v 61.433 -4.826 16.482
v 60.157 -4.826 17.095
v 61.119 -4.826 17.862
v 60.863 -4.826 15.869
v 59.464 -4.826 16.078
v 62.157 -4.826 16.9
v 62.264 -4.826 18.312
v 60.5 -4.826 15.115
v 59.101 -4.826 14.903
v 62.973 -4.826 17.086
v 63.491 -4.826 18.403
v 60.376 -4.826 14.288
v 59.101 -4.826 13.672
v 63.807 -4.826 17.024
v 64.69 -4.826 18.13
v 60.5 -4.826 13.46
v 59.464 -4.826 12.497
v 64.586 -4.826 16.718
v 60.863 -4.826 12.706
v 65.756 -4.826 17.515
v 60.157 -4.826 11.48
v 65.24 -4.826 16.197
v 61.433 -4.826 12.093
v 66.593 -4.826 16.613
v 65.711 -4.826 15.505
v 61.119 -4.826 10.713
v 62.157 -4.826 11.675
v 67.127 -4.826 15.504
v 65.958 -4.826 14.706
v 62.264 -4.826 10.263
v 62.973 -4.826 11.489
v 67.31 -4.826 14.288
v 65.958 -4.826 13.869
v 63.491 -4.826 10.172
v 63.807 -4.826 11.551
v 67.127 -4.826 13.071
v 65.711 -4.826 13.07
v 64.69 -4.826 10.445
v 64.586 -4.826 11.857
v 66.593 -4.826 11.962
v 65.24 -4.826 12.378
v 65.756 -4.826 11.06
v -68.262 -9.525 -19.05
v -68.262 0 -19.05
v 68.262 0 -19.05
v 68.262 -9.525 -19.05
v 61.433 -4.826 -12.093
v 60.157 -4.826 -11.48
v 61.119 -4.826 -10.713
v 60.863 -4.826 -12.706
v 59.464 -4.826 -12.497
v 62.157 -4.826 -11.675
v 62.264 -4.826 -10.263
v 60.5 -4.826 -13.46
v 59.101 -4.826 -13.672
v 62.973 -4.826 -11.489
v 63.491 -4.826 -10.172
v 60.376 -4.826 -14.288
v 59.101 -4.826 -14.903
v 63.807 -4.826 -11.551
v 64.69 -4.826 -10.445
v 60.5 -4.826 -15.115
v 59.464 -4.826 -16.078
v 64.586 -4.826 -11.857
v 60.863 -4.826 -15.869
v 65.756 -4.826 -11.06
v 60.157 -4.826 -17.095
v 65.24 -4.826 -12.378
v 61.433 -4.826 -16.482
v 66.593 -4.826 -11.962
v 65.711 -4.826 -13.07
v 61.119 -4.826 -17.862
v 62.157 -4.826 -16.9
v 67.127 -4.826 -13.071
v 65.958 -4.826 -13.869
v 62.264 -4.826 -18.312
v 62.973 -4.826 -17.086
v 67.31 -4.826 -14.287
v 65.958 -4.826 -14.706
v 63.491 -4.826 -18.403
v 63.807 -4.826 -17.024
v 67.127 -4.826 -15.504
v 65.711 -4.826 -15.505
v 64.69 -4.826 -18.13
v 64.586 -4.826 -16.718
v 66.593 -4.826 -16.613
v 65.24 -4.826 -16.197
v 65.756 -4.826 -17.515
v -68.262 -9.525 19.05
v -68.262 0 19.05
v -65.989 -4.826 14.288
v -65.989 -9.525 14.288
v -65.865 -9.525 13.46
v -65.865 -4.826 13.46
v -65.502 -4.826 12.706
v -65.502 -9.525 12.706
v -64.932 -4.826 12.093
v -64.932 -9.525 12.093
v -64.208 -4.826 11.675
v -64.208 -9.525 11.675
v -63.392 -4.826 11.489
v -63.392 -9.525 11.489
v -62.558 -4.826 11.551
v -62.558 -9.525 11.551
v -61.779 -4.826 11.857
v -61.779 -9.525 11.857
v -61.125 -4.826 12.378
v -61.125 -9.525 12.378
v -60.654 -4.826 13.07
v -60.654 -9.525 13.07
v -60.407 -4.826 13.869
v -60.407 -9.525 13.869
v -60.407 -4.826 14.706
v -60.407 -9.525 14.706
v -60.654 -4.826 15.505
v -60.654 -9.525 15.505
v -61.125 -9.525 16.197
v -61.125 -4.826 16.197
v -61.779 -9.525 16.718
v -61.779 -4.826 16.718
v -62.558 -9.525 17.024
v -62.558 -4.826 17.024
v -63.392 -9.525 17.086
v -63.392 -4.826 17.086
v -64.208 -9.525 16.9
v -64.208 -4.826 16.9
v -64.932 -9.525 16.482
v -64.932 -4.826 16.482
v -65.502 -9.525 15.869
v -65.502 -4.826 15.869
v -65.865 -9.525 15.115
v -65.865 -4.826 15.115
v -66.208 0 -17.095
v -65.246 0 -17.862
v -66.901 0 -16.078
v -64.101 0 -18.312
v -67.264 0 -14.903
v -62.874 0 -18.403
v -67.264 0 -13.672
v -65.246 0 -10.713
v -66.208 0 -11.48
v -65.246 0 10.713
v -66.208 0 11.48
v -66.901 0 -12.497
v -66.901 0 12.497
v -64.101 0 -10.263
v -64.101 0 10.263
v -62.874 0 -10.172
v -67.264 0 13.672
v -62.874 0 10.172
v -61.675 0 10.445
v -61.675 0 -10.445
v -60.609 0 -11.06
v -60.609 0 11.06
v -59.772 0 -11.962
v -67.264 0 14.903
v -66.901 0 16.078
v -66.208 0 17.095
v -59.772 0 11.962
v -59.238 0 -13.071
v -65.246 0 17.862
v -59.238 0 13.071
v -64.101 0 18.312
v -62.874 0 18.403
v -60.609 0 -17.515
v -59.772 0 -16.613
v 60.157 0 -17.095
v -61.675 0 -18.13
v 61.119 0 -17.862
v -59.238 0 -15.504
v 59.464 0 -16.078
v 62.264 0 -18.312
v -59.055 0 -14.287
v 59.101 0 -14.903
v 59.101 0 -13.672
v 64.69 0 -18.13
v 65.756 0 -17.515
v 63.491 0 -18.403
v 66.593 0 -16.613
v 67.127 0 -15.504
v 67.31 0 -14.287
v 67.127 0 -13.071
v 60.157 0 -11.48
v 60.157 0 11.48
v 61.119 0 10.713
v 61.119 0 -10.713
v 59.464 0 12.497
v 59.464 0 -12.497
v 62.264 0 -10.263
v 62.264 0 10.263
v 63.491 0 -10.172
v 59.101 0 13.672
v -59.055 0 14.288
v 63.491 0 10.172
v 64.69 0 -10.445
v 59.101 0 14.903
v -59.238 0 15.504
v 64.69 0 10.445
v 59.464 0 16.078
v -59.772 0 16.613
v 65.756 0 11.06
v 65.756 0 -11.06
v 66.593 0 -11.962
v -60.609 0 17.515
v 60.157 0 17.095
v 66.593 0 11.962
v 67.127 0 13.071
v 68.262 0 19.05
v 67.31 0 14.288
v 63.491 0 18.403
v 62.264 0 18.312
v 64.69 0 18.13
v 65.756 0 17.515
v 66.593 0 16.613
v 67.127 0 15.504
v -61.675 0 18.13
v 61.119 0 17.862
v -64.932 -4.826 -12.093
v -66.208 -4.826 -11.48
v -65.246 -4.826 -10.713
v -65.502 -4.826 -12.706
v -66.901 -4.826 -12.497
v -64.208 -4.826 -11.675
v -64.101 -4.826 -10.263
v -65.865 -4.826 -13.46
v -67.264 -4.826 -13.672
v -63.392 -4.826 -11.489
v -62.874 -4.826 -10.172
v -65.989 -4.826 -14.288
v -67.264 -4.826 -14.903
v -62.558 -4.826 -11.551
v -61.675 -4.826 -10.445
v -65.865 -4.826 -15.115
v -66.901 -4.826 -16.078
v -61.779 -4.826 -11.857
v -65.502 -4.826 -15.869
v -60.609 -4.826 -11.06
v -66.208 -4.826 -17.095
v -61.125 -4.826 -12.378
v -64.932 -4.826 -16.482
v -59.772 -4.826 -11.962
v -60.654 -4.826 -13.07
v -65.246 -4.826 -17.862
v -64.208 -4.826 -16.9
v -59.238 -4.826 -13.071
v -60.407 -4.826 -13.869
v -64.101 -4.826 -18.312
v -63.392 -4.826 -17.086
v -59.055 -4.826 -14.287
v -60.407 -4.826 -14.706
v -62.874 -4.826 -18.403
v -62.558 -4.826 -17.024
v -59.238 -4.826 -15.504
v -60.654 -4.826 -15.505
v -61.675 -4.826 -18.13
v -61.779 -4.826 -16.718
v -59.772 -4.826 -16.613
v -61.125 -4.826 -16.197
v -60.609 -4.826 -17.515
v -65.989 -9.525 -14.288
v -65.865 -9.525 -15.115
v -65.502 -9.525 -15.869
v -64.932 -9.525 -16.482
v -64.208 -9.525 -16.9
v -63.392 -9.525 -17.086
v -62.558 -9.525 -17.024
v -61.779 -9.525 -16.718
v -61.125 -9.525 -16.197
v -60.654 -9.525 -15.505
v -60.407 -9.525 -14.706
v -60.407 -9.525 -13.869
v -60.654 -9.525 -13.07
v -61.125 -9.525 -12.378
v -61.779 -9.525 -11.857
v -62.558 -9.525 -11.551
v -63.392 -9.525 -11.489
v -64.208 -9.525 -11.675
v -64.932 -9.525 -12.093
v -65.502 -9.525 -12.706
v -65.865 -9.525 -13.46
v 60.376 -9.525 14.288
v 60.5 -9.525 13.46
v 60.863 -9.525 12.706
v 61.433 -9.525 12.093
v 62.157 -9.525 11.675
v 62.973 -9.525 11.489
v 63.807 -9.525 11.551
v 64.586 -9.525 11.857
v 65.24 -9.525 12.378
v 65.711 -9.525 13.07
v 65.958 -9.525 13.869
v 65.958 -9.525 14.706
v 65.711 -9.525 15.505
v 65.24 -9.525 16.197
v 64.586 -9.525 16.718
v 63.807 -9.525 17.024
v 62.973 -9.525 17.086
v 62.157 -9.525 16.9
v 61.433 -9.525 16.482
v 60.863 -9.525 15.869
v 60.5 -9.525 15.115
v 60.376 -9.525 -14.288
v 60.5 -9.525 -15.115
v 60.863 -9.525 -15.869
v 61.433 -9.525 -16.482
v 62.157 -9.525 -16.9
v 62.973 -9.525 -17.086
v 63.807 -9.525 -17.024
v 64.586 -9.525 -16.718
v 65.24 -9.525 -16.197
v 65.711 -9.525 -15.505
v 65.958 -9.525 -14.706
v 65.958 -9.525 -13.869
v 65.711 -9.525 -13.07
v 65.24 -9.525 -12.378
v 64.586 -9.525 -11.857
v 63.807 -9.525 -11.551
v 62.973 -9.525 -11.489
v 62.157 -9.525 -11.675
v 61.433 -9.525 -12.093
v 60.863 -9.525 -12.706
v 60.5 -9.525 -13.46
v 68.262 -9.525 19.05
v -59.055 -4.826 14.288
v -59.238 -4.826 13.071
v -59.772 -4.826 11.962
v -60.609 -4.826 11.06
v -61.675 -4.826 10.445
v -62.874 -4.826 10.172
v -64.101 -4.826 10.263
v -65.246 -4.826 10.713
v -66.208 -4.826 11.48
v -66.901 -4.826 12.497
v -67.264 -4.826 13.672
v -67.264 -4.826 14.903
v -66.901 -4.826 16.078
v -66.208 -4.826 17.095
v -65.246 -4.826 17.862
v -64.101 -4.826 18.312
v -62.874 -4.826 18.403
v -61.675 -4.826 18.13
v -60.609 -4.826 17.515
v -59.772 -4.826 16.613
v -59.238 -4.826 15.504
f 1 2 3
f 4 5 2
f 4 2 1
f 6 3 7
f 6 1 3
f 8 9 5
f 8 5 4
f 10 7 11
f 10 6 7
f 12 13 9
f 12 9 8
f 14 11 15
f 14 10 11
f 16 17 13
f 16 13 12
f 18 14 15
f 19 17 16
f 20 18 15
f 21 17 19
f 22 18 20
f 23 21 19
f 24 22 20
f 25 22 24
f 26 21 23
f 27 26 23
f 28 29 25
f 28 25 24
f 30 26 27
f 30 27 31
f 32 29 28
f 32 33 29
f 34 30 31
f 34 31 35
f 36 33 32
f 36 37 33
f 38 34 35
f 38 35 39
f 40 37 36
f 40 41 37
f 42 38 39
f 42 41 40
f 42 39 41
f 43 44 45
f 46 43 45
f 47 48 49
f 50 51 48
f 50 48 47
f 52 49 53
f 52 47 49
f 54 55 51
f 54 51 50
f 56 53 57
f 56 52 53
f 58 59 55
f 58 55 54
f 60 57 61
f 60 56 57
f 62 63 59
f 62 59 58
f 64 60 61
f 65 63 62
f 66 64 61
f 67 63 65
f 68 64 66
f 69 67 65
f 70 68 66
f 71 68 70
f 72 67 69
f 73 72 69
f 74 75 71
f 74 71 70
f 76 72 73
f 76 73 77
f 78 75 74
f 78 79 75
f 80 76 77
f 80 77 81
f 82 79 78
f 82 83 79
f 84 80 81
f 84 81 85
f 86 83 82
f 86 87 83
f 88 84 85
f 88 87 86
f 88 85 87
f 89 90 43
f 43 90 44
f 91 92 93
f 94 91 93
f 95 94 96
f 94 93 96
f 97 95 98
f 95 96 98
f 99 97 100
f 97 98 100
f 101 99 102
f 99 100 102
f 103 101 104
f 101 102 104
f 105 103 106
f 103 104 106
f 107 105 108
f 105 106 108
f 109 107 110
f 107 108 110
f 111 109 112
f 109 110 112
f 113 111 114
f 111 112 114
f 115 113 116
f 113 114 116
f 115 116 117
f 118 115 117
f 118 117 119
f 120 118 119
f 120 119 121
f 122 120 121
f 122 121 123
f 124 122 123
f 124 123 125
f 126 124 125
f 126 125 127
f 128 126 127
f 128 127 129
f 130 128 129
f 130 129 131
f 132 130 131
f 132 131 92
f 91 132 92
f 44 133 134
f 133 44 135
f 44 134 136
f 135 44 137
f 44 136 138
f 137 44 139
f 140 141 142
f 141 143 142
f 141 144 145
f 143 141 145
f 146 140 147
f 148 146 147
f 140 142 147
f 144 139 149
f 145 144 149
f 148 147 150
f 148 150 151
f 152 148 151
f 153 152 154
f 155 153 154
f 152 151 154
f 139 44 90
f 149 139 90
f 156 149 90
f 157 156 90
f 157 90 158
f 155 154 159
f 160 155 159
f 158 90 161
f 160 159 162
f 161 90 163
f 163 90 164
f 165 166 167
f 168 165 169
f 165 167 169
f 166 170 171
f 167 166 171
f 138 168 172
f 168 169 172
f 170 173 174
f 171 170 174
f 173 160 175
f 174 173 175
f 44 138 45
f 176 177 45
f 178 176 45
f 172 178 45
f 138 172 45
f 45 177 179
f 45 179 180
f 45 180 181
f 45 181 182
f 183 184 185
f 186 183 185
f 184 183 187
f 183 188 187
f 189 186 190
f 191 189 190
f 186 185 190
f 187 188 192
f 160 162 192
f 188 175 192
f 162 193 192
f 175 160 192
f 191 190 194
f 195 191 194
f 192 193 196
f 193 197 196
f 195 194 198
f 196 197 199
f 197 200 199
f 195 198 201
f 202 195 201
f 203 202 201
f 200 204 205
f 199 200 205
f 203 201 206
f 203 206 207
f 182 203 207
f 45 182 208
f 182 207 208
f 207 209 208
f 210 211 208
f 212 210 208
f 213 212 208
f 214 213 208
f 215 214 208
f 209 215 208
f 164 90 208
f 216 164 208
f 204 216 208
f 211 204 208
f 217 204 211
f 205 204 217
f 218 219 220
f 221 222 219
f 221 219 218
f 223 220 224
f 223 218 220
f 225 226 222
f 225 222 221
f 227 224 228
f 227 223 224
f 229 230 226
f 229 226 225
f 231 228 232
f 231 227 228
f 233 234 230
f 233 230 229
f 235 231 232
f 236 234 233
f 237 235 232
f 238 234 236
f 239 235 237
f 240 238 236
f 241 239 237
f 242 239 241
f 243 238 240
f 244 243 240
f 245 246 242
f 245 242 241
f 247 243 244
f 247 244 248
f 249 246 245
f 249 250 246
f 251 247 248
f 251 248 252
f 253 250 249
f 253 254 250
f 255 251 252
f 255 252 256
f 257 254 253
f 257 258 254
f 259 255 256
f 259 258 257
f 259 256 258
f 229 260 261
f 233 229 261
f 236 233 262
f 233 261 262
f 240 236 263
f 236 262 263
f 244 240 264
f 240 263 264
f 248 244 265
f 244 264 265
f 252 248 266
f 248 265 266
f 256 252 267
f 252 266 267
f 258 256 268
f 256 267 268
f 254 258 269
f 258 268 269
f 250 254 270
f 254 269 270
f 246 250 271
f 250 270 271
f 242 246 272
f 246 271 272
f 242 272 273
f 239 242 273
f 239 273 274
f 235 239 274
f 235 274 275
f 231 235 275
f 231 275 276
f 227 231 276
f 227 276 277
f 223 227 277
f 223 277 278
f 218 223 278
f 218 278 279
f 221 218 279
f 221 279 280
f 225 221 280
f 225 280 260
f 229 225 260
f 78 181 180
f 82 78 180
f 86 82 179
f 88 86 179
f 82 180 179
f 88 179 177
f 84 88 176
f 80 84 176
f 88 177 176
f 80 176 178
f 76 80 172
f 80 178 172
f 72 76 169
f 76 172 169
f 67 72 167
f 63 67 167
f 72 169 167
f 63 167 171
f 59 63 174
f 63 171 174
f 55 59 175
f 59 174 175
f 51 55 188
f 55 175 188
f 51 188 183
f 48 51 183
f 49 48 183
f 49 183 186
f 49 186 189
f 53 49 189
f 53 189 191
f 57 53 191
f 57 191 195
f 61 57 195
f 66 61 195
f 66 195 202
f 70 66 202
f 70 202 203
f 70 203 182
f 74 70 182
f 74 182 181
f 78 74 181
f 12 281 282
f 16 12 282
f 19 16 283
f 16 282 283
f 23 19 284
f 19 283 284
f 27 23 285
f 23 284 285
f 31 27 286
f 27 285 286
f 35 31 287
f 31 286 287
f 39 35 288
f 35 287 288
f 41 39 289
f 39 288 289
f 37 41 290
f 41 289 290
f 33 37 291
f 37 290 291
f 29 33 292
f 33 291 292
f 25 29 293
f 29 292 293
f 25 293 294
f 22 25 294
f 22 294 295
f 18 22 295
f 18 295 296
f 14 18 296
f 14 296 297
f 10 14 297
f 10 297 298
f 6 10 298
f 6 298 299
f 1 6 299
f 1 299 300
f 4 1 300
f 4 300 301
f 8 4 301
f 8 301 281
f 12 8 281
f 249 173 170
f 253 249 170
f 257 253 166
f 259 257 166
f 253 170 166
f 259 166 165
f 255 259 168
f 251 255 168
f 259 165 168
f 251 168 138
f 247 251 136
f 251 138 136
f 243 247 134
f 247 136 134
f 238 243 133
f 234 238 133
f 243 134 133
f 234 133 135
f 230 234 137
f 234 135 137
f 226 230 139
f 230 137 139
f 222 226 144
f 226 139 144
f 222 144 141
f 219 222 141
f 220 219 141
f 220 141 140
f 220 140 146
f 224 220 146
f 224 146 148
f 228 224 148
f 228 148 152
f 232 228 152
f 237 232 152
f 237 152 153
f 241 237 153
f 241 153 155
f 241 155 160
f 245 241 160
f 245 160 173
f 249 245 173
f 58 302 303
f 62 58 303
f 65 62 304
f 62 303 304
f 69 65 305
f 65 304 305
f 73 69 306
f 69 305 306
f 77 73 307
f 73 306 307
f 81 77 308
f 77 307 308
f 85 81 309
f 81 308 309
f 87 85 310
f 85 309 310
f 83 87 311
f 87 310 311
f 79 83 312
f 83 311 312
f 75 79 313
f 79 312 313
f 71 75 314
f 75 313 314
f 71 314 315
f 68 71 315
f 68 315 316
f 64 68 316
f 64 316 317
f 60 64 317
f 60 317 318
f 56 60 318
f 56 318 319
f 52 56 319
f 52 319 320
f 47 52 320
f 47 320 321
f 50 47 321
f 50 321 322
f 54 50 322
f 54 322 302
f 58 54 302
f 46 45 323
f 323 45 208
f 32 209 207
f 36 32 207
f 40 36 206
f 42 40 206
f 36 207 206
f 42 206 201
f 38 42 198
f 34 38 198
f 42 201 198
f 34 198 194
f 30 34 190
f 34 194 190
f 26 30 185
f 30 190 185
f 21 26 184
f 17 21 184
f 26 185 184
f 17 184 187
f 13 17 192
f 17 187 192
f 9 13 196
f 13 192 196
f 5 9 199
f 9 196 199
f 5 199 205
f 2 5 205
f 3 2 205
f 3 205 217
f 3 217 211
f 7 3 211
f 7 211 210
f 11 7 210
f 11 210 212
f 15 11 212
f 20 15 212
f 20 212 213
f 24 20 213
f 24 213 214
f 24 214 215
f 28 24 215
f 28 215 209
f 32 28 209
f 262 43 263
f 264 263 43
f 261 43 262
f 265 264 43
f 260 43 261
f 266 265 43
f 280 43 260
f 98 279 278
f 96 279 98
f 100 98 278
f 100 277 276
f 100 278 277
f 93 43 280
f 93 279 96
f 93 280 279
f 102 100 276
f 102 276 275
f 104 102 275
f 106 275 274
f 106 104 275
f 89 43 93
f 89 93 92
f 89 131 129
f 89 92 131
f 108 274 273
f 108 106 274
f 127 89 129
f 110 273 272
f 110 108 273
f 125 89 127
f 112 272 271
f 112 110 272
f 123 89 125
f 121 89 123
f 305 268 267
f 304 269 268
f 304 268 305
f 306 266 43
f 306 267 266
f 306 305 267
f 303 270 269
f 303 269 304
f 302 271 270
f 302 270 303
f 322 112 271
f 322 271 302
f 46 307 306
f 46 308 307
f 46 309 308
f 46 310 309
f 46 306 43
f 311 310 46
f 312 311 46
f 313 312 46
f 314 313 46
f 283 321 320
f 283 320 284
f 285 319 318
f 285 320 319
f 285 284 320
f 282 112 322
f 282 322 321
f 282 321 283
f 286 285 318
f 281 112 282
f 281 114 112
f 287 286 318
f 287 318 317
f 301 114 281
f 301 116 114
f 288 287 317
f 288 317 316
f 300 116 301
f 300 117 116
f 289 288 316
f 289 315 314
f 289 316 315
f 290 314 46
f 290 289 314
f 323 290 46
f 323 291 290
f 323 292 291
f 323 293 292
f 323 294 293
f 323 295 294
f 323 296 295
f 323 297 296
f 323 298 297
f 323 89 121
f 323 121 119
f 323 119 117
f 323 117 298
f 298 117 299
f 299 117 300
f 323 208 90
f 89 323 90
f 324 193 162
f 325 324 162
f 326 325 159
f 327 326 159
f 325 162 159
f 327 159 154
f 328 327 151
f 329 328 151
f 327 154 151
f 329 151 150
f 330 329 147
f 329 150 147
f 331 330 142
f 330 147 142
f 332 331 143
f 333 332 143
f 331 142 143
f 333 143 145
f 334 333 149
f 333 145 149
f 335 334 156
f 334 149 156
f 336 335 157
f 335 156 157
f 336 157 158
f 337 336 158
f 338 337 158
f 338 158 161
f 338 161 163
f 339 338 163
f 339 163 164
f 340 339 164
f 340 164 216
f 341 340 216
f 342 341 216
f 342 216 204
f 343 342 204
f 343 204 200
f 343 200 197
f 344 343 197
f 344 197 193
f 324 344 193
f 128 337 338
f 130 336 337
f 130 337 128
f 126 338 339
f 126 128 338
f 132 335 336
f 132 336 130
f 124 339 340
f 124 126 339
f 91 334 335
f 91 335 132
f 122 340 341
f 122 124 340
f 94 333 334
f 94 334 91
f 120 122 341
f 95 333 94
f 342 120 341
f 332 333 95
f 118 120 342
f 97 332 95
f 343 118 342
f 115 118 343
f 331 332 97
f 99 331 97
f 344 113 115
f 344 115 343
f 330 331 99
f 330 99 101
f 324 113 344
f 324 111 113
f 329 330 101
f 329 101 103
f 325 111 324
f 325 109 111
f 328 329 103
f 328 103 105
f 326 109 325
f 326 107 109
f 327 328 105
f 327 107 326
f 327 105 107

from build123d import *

# Parameters (mm, degrees)
F1_DEPTH       = 9.525
F2_D           = 5.6134
F2_DEPTH       = 9.525
F2_CBORE_D     = 8.255
F2_CBORE_DEPTH = 4.826


with BuildPart() as f1:
    # F0 (on Front) → F1 (new body)
    with BuildSketch(Plane.XZ):
        Polygon((30.1625, 19.05), (-68.2625, 19.05), (-68.2625, -19.05), (68.2625, -19.05), (68.2625, 19.05), align=None)
    extrude(amount=F1_DEPTH)

    # F2
    with Locations(Plane(origin=(0, 0, 0), x_dir=(1, 0, 0), z_dir=(0, 1, 0))):
        with Locations((-63.1825, 14.2875), (-63.1825, -14.2875), (63.1825, -14.2875), (63.1825, 14.2875)):
            CounterBoreHole(F2_D / 2, F2_CBORE_D / 2, F2_CBORE_DEPTH, depth=F2_DEPTH)


solid = f1.part
